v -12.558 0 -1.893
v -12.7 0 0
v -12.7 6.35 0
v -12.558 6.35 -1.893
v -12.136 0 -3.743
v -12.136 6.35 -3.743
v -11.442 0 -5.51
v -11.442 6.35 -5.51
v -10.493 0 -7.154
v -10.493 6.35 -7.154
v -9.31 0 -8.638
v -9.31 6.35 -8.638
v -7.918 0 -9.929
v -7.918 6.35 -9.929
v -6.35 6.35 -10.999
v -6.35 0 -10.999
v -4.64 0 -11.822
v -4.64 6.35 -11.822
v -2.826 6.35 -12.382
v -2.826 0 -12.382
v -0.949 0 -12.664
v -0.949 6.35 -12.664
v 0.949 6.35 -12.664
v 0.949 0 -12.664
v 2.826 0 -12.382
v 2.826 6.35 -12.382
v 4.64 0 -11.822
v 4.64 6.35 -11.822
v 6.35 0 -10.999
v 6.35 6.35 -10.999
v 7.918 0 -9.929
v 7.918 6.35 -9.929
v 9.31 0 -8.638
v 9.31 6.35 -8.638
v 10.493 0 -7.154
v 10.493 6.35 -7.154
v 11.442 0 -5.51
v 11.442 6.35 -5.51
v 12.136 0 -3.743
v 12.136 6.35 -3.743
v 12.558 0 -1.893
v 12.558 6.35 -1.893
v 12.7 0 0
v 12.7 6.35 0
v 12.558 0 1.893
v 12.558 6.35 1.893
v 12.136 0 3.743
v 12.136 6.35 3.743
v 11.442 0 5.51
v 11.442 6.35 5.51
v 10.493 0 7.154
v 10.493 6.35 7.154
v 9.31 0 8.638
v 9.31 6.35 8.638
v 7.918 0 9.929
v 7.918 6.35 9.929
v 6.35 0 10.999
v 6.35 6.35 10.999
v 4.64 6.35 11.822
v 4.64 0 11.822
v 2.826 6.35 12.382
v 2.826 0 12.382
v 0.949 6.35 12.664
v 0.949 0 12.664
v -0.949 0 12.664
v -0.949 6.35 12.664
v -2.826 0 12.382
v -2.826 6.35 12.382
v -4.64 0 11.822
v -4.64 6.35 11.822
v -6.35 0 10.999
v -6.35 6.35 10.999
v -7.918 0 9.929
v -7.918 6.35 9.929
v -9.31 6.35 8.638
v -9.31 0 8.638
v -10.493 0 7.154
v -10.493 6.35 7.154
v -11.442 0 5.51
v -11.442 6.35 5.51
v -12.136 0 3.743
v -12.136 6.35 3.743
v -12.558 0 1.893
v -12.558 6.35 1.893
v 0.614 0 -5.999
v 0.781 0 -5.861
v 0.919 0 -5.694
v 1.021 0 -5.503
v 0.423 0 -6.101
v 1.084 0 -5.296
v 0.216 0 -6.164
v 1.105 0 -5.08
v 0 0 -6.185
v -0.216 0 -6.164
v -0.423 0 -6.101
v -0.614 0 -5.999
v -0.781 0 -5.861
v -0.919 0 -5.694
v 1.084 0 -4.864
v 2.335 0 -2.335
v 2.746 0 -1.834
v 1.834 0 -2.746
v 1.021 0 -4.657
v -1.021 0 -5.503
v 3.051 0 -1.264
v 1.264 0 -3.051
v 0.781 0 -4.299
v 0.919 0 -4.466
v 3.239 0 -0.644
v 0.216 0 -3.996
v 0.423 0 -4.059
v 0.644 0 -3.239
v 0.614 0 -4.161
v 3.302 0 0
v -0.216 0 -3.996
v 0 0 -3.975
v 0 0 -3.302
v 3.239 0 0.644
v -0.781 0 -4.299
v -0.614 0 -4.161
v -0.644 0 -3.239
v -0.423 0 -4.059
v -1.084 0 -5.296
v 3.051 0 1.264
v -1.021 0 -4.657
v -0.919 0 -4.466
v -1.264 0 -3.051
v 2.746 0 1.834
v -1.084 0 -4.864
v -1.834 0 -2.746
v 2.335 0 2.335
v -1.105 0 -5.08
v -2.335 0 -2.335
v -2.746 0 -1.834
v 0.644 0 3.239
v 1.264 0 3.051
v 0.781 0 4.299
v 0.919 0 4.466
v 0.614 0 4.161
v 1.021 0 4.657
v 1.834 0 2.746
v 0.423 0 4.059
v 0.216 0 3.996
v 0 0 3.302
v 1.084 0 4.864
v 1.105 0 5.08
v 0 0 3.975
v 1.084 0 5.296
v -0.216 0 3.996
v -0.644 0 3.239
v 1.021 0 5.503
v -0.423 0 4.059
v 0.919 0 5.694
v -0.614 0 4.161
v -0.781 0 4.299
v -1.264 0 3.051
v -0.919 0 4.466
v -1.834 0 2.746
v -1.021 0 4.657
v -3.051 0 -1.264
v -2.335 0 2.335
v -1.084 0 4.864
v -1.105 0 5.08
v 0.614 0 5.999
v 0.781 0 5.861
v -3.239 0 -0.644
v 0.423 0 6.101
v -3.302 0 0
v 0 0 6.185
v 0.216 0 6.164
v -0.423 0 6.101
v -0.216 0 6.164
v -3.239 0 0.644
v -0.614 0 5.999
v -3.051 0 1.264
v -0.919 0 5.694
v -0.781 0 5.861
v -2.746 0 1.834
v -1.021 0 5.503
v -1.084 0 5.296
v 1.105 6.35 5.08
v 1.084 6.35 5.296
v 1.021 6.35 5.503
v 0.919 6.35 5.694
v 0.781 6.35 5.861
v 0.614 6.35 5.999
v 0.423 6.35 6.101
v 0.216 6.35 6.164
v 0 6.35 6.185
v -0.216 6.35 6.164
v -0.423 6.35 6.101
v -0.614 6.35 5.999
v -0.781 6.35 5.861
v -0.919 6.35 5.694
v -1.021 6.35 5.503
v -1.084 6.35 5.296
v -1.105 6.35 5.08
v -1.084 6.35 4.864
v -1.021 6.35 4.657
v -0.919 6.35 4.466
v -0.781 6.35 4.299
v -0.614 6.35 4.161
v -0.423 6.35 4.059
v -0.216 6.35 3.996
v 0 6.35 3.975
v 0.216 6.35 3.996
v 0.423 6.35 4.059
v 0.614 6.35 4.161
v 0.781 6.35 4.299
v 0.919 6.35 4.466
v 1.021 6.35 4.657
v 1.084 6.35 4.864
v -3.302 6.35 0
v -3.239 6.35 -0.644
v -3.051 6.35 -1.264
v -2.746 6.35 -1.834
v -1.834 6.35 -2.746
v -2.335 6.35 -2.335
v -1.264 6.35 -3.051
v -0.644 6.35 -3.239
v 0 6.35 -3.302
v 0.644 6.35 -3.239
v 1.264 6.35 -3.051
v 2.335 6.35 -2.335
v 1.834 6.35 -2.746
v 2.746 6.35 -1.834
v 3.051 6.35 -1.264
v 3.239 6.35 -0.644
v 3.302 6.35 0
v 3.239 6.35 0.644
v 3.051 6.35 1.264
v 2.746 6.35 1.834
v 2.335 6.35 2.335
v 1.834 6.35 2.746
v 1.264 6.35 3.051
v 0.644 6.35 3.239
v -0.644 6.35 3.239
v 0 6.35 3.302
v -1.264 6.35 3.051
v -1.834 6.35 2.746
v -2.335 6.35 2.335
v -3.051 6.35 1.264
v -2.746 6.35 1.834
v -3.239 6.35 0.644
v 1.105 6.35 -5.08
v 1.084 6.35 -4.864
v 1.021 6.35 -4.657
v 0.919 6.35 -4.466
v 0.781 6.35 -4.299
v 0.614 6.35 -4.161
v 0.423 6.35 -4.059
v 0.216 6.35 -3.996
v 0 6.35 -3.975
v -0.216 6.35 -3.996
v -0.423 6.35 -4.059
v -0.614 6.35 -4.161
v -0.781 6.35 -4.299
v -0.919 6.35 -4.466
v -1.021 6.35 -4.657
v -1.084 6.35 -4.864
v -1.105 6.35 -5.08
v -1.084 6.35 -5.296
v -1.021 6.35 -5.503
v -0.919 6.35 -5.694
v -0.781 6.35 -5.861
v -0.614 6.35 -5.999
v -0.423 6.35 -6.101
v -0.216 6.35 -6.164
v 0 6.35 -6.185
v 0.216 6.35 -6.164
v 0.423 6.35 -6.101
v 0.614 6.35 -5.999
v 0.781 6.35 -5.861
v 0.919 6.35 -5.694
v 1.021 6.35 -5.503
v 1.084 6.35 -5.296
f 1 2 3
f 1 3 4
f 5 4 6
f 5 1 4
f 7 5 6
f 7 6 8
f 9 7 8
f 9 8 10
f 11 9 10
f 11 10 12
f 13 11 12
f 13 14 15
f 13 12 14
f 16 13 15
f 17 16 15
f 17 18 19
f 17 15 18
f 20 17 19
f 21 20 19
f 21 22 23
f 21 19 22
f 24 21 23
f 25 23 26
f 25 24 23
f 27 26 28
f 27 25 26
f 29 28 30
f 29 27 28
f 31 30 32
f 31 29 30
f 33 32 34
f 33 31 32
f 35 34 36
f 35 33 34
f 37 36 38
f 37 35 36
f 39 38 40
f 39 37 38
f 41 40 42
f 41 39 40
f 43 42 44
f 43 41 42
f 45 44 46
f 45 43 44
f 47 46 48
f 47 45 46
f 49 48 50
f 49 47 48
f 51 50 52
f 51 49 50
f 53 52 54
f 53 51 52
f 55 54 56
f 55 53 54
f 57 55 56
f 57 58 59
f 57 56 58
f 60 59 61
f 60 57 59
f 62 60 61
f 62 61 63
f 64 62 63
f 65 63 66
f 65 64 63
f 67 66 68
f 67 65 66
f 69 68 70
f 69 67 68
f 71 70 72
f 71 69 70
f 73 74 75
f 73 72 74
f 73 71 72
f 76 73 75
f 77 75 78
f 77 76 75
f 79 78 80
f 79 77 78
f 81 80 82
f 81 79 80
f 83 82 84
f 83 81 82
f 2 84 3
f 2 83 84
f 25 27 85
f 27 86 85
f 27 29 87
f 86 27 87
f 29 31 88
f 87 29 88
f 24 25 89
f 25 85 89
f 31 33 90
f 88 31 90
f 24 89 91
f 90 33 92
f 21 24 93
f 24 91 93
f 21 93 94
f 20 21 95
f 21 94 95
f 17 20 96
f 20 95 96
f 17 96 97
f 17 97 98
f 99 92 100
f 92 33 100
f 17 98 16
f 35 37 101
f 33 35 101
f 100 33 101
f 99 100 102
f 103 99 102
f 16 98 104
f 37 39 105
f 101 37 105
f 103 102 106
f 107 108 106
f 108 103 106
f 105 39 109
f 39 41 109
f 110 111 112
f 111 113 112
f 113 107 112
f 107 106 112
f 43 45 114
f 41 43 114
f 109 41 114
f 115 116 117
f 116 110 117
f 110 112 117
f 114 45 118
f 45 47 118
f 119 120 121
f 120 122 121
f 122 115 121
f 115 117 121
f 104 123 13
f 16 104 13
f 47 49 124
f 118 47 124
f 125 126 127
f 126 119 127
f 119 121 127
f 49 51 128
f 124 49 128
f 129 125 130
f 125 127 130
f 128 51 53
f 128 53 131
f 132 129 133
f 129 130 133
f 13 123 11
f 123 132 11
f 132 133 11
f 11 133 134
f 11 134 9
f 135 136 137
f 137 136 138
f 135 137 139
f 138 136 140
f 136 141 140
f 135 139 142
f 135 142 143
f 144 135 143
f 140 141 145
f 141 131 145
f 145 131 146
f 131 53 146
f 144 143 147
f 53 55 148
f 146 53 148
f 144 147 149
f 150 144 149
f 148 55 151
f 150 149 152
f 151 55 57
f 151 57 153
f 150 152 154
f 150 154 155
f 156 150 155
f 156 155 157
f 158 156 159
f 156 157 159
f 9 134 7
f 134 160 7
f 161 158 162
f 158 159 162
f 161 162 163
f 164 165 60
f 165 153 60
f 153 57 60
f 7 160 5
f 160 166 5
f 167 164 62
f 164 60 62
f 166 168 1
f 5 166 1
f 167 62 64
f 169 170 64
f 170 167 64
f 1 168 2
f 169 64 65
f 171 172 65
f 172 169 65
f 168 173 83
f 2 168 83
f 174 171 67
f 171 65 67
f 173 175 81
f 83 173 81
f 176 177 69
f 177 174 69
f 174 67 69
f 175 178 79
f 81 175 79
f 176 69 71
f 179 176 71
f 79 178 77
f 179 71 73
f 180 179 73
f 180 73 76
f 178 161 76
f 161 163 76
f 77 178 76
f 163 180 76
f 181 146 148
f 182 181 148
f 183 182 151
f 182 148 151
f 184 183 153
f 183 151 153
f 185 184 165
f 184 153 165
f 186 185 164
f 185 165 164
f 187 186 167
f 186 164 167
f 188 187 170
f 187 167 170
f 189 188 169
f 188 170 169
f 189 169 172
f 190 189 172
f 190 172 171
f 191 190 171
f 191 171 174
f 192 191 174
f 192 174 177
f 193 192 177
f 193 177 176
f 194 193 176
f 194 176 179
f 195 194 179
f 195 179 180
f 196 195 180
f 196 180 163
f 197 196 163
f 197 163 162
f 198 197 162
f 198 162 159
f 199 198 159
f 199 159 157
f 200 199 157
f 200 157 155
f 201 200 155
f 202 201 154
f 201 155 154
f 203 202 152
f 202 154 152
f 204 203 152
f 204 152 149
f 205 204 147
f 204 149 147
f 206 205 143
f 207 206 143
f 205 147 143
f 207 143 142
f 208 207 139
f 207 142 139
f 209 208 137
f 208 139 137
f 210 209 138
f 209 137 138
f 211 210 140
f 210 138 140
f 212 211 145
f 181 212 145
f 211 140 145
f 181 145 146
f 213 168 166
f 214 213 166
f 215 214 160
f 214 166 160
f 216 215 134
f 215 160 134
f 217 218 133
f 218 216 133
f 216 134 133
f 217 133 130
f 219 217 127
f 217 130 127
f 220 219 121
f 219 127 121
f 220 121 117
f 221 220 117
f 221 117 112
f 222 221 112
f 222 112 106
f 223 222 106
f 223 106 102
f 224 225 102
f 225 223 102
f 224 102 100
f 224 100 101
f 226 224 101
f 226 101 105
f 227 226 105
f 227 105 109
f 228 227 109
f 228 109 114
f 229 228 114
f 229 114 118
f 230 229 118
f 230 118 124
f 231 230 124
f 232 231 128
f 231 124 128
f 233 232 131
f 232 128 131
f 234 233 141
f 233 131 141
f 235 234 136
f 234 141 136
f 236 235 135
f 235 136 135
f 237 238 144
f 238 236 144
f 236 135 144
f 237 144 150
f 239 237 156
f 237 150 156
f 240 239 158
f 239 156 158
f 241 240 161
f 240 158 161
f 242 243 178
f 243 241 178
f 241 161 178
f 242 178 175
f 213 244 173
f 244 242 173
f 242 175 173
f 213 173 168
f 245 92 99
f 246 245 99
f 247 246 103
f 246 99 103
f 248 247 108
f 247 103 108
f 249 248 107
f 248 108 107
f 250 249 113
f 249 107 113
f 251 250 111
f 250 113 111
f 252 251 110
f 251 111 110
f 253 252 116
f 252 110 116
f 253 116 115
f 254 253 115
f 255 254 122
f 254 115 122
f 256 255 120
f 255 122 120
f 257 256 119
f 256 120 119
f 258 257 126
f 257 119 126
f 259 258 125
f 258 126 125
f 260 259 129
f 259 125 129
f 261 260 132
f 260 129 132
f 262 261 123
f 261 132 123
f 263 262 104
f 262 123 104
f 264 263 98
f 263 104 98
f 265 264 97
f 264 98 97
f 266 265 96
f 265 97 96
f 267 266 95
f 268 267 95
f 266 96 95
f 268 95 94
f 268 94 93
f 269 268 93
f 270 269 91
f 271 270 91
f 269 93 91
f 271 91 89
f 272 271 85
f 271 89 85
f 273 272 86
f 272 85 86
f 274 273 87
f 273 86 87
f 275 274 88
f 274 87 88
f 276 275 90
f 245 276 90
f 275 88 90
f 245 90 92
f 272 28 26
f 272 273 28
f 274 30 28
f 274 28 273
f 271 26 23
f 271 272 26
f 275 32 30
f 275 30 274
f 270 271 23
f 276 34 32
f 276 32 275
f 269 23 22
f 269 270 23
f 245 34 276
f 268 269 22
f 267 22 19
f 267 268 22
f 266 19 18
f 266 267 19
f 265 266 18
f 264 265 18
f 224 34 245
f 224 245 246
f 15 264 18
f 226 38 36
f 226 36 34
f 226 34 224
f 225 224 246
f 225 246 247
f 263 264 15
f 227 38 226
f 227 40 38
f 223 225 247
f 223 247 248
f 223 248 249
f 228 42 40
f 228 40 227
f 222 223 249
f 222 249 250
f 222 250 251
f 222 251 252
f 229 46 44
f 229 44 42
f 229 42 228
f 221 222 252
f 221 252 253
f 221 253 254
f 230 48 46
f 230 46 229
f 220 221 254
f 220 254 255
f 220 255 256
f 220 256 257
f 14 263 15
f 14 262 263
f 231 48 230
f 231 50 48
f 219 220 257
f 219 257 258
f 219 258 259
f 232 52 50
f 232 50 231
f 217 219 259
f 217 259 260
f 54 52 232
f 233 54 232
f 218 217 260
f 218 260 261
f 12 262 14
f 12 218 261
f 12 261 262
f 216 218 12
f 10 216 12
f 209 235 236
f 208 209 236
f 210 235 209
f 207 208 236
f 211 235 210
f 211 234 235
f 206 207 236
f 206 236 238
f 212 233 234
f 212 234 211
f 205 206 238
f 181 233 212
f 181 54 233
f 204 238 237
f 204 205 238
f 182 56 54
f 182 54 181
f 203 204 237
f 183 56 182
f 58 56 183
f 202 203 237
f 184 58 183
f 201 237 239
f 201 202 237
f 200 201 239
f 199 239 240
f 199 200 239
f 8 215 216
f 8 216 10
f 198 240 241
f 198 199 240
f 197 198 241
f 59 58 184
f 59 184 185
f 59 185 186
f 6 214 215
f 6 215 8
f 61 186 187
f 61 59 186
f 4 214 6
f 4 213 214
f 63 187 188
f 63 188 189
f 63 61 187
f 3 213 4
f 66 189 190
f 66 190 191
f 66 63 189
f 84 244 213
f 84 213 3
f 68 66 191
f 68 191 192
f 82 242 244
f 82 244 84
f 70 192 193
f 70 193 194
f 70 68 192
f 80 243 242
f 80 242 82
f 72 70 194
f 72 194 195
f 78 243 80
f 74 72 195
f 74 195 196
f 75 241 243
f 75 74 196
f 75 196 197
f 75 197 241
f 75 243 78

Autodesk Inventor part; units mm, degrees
ref_plane "YZ Plane" through (0, 0, 0) normal (1, 0, 0) x (0, 1, 0)
ref_plane "XZ Plane" through (0, 0, 0) normal (0, 1, 0) x (-1, 0, 0)
ref_plane "XY Plane" through (0, 0, 0) normal (0, 0, 1) x (1, 0, 0)
sketch "Sketch1" plane through (0, 0, 0) normal (0, 1, 0) x (-1, 0, 0)
  circle A0 centre (0, 0) radius 12.7
  circle A1 centre (0, 0) radius 3.302
  dimension "d0" = 25.4
  dimension "d1" = 6.604
extrude "Extrusion1" add sketch "Sketch1" along normal blind 6.35
sketch "Sketch2" plane through (0, 6.35, 0) normal (0, 1, 0) x (1, 0, 0)
  line L0 (0, 0) -> (0, -5.08)
  line L1 (0, -5.08) -> (0, 0)
  line L2 (0, 0) -> (0, 5.08)
  circle A0 centre (0, -5.08) radius 1.1049
  circle A1 centre (0, 5.08) radius 1.1049
  dimension "d4" = 5.08
  dimension "d5" = 5.08
  dimension "d6" = 2.2098
  dimension "d7" = 2.2098
extrude "Extrusion2" cut sketch "Sketch2" against normal blind 4.445
sketch "Sketch3" plane through (0, 0, 0) normal (0, -1, 0) x (1, 0, 0)
  line L0 (0, 0) -> (0, 5.08)
  line L1 (0, 5.08) -> (0, -5.08)
  circle A0 centre (0, 5.08) radius 1.1049
  circle A1 centre (0, -5.08) radius 1.1049
  dimension "d10" = 5.08
  dimension "d11" = 10.16
  dimension "d14" = 2.2098
  dimension "d15" = 2.2098
extrude "Extrusion3" cut sketch "Sketch3" against normal blind 1.905
properties part number "PolarisPost_HeightAdjustment_0p25in_smallholesfrom0p79to0p81"
